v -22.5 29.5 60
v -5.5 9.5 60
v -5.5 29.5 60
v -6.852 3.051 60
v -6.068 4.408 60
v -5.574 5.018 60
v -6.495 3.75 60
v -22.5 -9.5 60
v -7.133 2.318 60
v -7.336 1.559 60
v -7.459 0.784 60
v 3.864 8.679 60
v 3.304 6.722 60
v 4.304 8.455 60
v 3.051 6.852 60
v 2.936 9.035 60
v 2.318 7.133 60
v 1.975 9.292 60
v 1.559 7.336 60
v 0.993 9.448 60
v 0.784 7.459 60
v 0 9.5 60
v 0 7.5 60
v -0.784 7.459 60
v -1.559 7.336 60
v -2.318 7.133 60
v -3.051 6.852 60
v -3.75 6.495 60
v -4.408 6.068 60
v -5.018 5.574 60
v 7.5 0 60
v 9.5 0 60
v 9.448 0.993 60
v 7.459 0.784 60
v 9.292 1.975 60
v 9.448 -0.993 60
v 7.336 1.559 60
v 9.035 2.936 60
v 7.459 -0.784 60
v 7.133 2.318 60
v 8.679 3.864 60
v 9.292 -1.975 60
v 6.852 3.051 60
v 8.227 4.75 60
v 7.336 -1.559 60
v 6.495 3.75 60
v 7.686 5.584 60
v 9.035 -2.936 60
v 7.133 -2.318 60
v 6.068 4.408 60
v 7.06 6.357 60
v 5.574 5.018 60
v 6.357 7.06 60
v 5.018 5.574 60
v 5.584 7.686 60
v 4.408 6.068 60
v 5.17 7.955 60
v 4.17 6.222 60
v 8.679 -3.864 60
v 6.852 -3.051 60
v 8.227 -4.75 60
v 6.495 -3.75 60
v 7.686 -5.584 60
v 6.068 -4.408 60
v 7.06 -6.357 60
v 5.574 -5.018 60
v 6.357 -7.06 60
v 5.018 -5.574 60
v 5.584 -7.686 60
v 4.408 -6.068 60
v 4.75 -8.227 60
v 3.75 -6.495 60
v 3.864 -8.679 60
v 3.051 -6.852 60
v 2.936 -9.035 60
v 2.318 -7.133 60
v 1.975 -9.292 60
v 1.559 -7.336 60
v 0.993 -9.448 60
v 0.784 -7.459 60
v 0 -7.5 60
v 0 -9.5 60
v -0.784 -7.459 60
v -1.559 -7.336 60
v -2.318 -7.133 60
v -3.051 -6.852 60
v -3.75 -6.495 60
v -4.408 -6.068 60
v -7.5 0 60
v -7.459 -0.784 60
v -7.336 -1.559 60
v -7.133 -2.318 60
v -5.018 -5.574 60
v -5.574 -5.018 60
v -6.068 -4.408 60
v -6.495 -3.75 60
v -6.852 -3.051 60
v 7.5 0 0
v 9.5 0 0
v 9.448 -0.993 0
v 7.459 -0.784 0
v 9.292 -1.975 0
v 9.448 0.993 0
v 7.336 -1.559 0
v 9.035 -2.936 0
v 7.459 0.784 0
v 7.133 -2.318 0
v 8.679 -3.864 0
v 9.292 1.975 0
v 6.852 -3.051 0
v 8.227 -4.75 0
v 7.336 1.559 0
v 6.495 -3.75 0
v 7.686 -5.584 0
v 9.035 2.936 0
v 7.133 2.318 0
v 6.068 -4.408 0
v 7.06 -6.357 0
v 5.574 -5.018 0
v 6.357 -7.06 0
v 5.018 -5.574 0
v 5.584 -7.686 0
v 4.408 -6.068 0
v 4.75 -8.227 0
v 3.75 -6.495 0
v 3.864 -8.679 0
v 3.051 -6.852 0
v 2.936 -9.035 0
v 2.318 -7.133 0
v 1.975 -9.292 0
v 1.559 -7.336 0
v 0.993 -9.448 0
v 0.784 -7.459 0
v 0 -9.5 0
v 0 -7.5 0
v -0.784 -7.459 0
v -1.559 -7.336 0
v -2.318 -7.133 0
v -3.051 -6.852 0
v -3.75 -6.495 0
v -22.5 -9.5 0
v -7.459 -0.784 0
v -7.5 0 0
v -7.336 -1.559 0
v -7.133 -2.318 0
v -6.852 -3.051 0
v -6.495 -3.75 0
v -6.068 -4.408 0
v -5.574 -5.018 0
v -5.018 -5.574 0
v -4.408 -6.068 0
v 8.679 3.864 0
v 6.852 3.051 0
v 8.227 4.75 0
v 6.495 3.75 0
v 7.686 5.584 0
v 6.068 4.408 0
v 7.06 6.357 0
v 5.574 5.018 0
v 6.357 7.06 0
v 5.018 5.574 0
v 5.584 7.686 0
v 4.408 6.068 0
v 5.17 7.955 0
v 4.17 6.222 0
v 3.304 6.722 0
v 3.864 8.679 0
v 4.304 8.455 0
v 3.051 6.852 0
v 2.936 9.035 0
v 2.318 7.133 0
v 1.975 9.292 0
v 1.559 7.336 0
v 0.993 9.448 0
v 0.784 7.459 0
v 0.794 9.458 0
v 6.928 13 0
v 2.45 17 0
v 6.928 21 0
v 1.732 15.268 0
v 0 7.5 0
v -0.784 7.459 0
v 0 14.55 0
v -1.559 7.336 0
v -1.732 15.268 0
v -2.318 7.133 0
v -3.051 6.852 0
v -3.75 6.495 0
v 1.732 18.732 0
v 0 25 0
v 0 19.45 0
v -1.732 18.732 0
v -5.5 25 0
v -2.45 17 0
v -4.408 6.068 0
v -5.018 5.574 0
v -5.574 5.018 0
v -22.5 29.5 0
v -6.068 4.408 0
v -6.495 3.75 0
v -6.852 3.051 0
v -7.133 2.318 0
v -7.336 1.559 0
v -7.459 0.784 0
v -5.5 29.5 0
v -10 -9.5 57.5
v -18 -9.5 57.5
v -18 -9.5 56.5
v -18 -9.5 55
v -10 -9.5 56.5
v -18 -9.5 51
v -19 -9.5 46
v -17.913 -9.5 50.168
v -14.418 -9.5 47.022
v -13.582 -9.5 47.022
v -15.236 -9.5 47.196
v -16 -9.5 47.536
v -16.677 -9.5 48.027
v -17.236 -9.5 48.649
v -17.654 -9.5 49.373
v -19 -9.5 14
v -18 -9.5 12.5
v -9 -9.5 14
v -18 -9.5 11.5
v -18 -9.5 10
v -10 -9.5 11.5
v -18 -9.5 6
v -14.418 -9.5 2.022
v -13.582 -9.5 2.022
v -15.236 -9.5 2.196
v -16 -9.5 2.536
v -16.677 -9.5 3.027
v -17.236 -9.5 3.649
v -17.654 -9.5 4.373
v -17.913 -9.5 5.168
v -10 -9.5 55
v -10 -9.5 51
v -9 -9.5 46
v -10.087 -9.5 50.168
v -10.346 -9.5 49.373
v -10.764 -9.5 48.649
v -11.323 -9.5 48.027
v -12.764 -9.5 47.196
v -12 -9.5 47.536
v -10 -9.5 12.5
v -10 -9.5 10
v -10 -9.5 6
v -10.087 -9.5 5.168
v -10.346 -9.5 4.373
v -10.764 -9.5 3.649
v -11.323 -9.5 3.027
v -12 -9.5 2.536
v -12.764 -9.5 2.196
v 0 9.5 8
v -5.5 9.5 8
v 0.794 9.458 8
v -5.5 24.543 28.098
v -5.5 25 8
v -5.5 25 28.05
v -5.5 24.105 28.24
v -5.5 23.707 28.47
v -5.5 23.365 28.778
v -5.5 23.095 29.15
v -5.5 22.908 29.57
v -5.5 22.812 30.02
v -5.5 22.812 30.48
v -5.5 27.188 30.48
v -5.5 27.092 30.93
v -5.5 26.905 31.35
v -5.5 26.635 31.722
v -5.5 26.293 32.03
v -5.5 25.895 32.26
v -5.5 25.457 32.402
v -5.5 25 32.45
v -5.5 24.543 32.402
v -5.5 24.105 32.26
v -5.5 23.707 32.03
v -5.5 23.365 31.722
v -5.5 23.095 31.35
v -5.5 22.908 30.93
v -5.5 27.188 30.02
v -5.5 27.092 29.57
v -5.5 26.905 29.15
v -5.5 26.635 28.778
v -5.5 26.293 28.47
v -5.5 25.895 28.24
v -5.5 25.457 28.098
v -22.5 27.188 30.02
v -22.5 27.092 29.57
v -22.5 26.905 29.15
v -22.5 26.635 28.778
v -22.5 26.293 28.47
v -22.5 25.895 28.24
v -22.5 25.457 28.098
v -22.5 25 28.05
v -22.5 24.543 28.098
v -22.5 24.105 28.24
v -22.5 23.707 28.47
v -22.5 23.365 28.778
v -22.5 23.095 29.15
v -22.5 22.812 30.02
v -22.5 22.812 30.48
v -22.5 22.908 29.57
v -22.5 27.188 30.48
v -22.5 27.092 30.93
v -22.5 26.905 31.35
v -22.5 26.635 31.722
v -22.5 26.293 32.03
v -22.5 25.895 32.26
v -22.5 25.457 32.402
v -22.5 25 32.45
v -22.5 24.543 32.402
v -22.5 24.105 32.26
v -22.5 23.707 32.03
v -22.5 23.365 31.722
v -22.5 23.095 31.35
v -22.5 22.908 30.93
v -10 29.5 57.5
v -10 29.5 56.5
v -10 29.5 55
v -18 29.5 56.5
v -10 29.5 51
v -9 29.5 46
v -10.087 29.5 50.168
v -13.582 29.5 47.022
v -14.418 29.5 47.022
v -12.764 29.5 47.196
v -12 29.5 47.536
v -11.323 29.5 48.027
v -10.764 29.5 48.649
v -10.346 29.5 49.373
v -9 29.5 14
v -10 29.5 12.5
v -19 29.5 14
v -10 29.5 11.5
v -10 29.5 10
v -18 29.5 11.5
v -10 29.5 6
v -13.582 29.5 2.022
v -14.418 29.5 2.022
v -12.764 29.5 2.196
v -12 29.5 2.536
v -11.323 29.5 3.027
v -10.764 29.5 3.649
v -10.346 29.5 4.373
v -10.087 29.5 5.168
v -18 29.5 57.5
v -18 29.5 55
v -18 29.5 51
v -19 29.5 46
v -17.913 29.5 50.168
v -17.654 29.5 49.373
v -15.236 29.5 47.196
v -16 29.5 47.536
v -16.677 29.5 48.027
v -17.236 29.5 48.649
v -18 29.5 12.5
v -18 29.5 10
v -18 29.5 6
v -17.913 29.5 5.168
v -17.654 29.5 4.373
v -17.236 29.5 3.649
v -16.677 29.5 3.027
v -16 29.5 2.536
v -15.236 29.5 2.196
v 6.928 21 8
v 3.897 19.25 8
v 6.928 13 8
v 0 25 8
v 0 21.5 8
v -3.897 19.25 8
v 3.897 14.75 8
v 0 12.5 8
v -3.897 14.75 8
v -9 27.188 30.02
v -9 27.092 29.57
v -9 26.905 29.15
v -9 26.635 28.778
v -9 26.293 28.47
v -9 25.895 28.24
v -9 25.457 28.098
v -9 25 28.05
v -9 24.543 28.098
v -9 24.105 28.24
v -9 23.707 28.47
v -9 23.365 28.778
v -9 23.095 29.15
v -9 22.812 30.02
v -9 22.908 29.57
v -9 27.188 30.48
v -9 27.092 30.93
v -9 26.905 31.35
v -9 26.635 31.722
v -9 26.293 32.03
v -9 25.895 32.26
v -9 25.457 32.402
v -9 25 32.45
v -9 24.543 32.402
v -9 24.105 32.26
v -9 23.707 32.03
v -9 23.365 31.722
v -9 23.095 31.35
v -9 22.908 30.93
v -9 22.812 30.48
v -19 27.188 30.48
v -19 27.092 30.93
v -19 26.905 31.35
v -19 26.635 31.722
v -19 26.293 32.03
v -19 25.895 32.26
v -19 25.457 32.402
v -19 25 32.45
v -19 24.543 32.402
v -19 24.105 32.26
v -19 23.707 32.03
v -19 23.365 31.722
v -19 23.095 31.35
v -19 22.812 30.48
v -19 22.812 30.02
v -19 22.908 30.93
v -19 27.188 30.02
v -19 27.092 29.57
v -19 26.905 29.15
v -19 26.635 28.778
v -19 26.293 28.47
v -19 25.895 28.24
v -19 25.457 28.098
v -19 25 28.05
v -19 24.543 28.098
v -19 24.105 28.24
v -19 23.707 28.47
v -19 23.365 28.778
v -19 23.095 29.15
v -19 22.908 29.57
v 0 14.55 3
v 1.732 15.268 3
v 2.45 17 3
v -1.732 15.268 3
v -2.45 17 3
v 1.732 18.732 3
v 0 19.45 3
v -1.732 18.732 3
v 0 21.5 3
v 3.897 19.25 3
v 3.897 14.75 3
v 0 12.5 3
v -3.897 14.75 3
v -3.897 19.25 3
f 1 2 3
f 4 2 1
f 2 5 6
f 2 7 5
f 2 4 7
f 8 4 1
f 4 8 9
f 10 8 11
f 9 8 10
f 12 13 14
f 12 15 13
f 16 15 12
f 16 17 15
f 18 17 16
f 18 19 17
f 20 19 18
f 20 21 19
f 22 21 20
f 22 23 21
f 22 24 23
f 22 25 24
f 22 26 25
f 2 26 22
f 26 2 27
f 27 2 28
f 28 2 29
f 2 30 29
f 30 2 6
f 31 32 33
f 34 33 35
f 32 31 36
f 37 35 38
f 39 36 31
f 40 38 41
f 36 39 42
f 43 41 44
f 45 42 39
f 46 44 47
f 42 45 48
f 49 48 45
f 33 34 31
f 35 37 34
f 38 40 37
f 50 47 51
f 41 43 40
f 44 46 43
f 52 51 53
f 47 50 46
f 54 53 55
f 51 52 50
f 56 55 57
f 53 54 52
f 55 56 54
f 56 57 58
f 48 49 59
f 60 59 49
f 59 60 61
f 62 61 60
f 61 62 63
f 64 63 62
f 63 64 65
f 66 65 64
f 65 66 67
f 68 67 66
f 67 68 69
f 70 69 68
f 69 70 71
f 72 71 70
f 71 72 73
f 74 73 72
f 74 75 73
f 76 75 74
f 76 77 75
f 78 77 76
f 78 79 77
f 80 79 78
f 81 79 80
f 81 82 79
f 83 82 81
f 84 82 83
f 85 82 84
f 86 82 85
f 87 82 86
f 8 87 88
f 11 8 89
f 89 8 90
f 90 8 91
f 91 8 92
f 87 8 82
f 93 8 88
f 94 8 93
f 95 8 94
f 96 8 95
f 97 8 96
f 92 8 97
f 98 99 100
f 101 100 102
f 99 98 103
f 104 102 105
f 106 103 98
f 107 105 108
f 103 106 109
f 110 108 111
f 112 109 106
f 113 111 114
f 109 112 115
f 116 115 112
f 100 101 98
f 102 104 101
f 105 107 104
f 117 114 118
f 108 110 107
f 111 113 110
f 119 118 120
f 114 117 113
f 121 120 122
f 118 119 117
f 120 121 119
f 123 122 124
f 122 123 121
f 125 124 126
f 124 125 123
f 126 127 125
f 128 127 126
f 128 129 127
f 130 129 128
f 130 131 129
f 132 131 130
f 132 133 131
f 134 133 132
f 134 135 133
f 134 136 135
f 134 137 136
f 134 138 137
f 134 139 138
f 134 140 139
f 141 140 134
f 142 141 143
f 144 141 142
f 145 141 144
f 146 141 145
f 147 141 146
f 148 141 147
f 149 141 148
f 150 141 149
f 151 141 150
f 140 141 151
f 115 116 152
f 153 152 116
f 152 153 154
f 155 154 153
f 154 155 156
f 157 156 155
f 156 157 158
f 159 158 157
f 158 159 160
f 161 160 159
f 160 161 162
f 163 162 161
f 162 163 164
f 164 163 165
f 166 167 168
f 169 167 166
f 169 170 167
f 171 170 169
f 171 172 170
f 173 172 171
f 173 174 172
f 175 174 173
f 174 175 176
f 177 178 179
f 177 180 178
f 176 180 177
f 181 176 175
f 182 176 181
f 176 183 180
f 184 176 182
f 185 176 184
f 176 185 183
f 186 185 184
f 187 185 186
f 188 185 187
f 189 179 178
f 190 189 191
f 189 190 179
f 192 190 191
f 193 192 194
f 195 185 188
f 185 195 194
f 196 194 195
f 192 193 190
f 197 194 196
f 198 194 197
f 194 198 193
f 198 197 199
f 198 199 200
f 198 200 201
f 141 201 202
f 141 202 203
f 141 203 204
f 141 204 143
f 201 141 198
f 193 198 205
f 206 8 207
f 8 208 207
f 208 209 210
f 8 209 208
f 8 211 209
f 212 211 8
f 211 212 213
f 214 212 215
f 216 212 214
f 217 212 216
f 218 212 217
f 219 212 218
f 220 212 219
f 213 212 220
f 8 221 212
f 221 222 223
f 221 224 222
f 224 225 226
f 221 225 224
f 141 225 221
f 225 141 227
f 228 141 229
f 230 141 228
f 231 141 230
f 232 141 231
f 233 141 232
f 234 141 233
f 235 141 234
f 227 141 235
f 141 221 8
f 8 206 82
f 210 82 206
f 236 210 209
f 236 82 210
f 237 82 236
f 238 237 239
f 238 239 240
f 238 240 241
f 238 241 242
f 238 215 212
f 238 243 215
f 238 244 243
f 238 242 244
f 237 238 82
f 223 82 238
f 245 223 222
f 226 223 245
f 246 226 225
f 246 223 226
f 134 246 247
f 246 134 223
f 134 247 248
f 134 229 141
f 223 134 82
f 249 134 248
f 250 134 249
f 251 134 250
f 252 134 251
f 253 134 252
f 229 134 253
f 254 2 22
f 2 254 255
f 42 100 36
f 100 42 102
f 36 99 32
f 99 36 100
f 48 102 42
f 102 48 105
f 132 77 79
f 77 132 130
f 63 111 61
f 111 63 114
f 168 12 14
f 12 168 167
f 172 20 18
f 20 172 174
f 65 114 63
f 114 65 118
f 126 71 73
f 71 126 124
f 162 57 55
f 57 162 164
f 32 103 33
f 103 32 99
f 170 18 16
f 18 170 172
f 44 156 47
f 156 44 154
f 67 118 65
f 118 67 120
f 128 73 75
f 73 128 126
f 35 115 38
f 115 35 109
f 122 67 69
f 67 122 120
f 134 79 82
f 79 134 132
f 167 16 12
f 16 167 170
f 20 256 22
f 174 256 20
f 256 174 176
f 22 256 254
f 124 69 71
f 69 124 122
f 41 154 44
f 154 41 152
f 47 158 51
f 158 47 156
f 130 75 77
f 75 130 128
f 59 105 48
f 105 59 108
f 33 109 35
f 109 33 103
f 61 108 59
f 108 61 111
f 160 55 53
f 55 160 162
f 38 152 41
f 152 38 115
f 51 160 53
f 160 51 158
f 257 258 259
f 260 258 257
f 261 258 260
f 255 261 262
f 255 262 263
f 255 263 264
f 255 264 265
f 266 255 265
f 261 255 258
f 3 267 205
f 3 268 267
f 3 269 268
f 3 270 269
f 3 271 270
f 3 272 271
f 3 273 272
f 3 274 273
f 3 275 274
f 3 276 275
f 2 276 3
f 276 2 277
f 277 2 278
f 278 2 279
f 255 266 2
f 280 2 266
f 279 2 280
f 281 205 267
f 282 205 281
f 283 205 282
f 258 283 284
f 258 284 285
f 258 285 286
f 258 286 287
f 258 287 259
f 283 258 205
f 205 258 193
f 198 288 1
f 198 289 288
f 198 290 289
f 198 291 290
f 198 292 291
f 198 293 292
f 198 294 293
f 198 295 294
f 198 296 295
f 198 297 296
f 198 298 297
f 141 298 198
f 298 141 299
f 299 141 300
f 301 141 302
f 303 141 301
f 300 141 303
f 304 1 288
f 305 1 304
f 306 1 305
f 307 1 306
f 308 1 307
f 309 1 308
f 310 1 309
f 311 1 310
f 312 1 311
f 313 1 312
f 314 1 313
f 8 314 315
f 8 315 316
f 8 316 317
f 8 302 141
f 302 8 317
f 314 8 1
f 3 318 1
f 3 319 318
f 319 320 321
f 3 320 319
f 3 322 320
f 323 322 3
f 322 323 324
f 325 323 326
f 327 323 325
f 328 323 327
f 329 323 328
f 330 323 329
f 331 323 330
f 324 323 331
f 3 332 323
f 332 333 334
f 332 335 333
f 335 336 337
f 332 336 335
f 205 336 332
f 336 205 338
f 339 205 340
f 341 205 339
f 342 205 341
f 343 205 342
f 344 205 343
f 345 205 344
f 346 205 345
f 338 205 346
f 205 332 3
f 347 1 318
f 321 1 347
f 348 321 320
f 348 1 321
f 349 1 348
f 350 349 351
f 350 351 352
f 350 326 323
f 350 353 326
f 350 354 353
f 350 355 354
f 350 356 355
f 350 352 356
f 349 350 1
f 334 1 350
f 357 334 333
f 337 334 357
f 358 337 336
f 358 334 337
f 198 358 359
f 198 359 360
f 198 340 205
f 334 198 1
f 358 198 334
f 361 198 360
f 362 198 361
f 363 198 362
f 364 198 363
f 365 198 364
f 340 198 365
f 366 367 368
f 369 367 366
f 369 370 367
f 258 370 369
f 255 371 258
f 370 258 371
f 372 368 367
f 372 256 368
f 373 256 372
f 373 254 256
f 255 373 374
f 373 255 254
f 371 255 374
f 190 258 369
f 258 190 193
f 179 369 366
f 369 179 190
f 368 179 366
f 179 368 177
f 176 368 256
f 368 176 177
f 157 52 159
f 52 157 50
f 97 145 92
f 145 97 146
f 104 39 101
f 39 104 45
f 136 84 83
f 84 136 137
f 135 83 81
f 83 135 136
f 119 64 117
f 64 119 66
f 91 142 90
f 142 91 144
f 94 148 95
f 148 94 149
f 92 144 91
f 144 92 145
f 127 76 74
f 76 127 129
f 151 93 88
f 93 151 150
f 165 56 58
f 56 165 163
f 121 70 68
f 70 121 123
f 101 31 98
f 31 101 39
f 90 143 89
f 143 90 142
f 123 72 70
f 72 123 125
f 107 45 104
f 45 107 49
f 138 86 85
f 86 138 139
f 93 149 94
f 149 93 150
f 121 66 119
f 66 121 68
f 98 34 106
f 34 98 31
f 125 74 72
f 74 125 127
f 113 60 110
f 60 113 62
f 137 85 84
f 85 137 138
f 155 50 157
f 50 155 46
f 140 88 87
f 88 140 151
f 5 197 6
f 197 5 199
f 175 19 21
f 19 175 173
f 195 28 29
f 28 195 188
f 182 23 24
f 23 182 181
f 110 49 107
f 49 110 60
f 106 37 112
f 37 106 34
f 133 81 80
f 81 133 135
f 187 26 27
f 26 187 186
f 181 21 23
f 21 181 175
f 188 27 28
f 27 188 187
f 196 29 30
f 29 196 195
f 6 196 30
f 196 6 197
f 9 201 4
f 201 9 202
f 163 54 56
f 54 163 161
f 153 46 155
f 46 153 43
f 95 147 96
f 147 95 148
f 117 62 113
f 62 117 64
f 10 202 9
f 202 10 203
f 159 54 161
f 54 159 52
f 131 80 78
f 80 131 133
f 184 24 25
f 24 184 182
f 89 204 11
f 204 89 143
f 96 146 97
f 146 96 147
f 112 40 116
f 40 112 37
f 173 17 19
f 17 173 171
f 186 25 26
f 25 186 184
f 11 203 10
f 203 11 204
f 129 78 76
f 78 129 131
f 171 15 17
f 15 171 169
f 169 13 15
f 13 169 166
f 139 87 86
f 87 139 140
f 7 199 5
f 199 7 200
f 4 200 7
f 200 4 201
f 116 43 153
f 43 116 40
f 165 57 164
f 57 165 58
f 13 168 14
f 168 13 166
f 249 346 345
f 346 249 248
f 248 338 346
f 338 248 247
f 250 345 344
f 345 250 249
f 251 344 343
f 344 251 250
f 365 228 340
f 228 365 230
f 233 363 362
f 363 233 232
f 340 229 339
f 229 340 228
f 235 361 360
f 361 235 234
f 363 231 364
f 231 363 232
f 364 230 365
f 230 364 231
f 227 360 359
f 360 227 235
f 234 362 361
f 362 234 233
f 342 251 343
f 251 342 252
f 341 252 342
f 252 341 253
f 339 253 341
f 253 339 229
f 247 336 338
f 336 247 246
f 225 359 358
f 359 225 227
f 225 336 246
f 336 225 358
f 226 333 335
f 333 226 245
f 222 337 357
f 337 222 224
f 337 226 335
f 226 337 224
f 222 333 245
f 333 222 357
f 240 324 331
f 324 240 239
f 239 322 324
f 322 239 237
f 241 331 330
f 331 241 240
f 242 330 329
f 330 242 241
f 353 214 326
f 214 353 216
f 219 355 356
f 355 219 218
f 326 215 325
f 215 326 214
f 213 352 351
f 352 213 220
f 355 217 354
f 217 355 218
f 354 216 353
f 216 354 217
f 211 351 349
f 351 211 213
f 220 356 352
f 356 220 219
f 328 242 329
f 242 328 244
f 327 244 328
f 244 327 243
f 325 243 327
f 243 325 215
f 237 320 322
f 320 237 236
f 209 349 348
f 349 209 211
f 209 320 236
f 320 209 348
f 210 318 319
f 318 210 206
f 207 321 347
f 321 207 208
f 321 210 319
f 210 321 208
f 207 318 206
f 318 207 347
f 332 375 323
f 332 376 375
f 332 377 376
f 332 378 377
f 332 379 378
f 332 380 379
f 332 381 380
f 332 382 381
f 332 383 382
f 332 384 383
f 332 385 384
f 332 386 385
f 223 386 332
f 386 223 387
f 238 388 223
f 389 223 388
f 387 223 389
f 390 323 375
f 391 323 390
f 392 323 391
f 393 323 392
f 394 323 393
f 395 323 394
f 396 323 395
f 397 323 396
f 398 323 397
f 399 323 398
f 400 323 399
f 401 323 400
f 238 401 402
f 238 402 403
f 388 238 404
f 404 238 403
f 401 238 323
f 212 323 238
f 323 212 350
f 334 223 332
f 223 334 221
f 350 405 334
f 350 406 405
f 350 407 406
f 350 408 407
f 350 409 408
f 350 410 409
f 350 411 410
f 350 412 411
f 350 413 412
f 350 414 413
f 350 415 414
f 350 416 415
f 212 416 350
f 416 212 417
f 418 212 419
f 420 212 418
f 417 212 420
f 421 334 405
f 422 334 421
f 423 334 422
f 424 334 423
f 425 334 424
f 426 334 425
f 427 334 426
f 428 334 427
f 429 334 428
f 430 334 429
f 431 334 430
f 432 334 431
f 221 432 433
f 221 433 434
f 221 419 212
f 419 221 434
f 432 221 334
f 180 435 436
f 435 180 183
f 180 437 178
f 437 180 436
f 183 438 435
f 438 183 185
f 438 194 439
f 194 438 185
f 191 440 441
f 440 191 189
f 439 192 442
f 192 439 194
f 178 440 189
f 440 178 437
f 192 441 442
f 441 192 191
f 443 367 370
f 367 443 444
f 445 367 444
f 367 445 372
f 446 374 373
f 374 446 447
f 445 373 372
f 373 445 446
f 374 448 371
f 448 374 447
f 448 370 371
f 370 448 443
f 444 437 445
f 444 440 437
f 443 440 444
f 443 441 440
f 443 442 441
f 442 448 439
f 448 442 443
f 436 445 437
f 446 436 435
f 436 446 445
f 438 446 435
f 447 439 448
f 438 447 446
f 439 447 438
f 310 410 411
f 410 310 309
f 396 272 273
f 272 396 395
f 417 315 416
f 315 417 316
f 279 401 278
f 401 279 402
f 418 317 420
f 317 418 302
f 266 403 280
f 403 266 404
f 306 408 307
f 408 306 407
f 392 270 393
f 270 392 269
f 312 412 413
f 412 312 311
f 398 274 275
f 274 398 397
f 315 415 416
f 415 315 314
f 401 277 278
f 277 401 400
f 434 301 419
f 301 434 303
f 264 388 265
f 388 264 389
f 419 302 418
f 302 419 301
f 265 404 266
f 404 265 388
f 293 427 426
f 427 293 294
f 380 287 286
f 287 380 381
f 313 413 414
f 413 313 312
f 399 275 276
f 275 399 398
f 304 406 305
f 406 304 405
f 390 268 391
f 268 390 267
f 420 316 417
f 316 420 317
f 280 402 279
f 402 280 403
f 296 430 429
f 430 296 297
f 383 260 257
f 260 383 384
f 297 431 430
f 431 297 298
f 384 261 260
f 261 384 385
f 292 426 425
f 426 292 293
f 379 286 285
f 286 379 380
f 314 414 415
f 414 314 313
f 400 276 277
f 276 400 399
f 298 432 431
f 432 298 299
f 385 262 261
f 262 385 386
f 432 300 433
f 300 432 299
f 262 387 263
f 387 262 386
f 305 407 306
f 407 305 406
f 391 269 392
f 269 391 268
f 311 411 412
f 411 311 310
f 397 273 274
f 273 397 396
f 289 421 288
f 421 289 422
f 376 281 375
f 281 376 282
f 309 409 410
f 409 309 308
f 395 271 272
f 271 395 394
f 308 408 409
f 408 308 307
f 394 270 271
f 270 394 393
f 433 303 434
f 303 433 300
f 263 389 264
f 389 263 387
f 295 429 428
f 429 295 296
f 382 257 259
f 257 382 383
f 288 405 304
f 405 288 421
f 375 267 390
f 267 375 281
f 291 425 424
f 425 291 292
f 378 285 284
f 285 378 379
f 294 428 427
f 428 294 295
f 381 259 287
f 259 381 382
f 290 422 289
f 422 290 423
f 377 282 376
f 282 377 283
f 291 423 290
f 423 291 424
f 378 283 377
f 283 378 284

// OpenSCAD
// file: bearing.scad
// PRUSA iteration3
// Bearing holders
// GNU GPL v3
// Josef Průša <iam@josefprusa.cz> and contributors
// http://www.reprap.org/wiki/Prusa_Mendel
// http://prusamendel.org

bearing_diameter = 15;

module horizontal_bearing_base(bearings=1){
 translate(v=[0,0,6]) cube(size = [24,8+bearings*25,12], center = true);	
}
module horizontal_bearing_holes(bearings=1){
 cutter_lenght = 10+bearings*25;
 one_holder_lenght = 8+25;
 holder_lenght = 8+bearings*25;
 
 // Main bearing cut
 difference(){
  translate(v=[0,0,12]) rotate(a=[90,0,0]) translate(v=[0,0,-cutter_lenght/2]) cylinder(h = cutter_lenght, r=bearing_diameter/2, $fn=50);
  // Bearing retainers
  translate(v=[0,1-holder_lenght/2,3]) cube(size = [24,6,8], center = true);
  translate(v=[0,-1+holder_lenght/2,3]) cube(size = [24,6,8], center = true);
 }
 
 // Ziptie cutouts
 ziptie_cut_ofset = 0;
 for ( i = [0 : bearings-1] ){
  // For easier positioning I move them by half of one 
  // bearing holder then add each bearign lenght and then center again
  translate(v=[0,-holder_lenght/2,0]) translate(v=[0,one_holder_lenght/2+i*25,0]) difference(){
   union(){
    translate(v=[0,2-6,12]) rotate(a=[90,0,0]) translate(v=[0,0,0]) cylinder(h = 4, r=12.5, $fn=50);
    translate(v=[0,2+6,12]) rotate(a=[90,0,0]) translate(v=[0,0,0]) cylinder(h = 4, r=12.5, $fn=50);
   }
   translate(v=[0,10,12]) rotate(a=[90,0,0]) translate(v=[0,0,0]) cylinder(h = 24, r=10, $fn=50);
  }
 }
 
}

module horizontal_bearing_test(){
 difference(){
  horizontal_bearing_base(1);
  horizontal_bearing_holes(1);
 }
 translate(v=[30,0,0]) difference(){
  horizontal_bearing_base(2);
  horizontal_bearing_holes(2);
 }
 translate(v=[60,0,0]) difference(){
  horizontal_bearing_base(3);
  horizontal_bearing_holes(3);
 }
}



thinwall = 2;
bearing_size = bearing_diameter + 2 * thinwall;

module vertical_bearing_base(){
 translate(v=[-2-bearing_size/4,0,30]) cube(size = [4+bearing_size/2,bearing_size,60], center = true);
 cylinder(h = 60, r=bearing_size/2, $fn = 60);
}

module vertical_bearing_holes(){
  translate(v=[0,0,-1]) cylinder(h = 62, r=bearing_diameter/2, $fn = 60);
  rotate(a=[0,0,-60]) translate(v=[10,0,31]) cube(size = [10,1,62], center = true);
}

difference(){
vertical_bearing_base();
vertical_bearing_holes();
}
// file: x-end.scad
// PRUSA iteration3
// X end prototype
// GNU GPL v3
// Josef Průša <iam@josefprusa.cz> and contributors
// http://www.reprap.org/wiki/Prusa_Mendel
// http://prusamendel.org

use <bearing.scad>
rod_distance = 45;

module x_end_base(){
// Main block
translate(v=[-14,-10,30]) cube(size = [17,39,60], center = true);
// Bearing holder
vertical_bearing_base();	
//Nut trap
 // Cube
 translate(v=[-2-2,-17,4]) cube(size = [8,16,8], center = true);
 // Hexagon
 translate(v=[0,-17,0]) rotate([0,0,30]) cylinder(h = 8, r=8, $fn = 6);
}

module x_end_holes(){
vertical_bearing_holes();
// Belt hole
translate(v=[-5.5-10+1.5,-10,30]) cube(size = [10,46,32], center = true);
// Bottom pushfit rod
translate(v=[-14,-40,6]) rotate(a=[-90,0,0]) pushfit_rod(8,50);
// Top pushfit rod
translate(v=[-14,-40,rod_distance+6]) rotate(a=[-90,0,0]) pushfit_rod(8,50);
// Nut trap
 translate(v=[0,-17,-1]) cylinder(h = 10, r=2.45);
 translate(v=[0,-17,3]) rotate([0,0,30]) cylinder(h = 5, r=4.5, $fn = 6);
}


// Final prototype
module x_end_plain(){
 difference(){
  x_end_base();
  x_end_holes();
 }
}

//x_end_plain();


module pushfit_rod(diameter,length){
 cylinder(h = length, r=diameter/2, $fn=30);
 translate(v=[0,-diameter/4,length/2]) cube(size = [diameter,diameter/2,length], center = true);
 translate(v=[0,-diameter/2-2,length/2]) cube(size = [diameter,1,length], center = true);
}
// main file
// PRUSA iteration3
// X end idler
// GNU GPL v3
// Josef Průša <iam@josefprusa.cz> and contributors
// http://www.reprap.org/wiki/Prusa_Mendel
// http://prusamendel.org

use <x-end.scad>

module x_end_idler_base(){
 x_end_base();
}

module x_end_idler_holes(){
 x_end_holes();
 translate(v=[0,-25,30.25]) rotate(a=[0,-90,0]) cylinder(h = 80, r=2.2, $fn=30);
}

// Final part
module x_end_idler(){
 mirror([0,1,0]) difference(){
  x_end_idler_base();
  x_end_idler_holes();
 }
}

x_end_idler();
